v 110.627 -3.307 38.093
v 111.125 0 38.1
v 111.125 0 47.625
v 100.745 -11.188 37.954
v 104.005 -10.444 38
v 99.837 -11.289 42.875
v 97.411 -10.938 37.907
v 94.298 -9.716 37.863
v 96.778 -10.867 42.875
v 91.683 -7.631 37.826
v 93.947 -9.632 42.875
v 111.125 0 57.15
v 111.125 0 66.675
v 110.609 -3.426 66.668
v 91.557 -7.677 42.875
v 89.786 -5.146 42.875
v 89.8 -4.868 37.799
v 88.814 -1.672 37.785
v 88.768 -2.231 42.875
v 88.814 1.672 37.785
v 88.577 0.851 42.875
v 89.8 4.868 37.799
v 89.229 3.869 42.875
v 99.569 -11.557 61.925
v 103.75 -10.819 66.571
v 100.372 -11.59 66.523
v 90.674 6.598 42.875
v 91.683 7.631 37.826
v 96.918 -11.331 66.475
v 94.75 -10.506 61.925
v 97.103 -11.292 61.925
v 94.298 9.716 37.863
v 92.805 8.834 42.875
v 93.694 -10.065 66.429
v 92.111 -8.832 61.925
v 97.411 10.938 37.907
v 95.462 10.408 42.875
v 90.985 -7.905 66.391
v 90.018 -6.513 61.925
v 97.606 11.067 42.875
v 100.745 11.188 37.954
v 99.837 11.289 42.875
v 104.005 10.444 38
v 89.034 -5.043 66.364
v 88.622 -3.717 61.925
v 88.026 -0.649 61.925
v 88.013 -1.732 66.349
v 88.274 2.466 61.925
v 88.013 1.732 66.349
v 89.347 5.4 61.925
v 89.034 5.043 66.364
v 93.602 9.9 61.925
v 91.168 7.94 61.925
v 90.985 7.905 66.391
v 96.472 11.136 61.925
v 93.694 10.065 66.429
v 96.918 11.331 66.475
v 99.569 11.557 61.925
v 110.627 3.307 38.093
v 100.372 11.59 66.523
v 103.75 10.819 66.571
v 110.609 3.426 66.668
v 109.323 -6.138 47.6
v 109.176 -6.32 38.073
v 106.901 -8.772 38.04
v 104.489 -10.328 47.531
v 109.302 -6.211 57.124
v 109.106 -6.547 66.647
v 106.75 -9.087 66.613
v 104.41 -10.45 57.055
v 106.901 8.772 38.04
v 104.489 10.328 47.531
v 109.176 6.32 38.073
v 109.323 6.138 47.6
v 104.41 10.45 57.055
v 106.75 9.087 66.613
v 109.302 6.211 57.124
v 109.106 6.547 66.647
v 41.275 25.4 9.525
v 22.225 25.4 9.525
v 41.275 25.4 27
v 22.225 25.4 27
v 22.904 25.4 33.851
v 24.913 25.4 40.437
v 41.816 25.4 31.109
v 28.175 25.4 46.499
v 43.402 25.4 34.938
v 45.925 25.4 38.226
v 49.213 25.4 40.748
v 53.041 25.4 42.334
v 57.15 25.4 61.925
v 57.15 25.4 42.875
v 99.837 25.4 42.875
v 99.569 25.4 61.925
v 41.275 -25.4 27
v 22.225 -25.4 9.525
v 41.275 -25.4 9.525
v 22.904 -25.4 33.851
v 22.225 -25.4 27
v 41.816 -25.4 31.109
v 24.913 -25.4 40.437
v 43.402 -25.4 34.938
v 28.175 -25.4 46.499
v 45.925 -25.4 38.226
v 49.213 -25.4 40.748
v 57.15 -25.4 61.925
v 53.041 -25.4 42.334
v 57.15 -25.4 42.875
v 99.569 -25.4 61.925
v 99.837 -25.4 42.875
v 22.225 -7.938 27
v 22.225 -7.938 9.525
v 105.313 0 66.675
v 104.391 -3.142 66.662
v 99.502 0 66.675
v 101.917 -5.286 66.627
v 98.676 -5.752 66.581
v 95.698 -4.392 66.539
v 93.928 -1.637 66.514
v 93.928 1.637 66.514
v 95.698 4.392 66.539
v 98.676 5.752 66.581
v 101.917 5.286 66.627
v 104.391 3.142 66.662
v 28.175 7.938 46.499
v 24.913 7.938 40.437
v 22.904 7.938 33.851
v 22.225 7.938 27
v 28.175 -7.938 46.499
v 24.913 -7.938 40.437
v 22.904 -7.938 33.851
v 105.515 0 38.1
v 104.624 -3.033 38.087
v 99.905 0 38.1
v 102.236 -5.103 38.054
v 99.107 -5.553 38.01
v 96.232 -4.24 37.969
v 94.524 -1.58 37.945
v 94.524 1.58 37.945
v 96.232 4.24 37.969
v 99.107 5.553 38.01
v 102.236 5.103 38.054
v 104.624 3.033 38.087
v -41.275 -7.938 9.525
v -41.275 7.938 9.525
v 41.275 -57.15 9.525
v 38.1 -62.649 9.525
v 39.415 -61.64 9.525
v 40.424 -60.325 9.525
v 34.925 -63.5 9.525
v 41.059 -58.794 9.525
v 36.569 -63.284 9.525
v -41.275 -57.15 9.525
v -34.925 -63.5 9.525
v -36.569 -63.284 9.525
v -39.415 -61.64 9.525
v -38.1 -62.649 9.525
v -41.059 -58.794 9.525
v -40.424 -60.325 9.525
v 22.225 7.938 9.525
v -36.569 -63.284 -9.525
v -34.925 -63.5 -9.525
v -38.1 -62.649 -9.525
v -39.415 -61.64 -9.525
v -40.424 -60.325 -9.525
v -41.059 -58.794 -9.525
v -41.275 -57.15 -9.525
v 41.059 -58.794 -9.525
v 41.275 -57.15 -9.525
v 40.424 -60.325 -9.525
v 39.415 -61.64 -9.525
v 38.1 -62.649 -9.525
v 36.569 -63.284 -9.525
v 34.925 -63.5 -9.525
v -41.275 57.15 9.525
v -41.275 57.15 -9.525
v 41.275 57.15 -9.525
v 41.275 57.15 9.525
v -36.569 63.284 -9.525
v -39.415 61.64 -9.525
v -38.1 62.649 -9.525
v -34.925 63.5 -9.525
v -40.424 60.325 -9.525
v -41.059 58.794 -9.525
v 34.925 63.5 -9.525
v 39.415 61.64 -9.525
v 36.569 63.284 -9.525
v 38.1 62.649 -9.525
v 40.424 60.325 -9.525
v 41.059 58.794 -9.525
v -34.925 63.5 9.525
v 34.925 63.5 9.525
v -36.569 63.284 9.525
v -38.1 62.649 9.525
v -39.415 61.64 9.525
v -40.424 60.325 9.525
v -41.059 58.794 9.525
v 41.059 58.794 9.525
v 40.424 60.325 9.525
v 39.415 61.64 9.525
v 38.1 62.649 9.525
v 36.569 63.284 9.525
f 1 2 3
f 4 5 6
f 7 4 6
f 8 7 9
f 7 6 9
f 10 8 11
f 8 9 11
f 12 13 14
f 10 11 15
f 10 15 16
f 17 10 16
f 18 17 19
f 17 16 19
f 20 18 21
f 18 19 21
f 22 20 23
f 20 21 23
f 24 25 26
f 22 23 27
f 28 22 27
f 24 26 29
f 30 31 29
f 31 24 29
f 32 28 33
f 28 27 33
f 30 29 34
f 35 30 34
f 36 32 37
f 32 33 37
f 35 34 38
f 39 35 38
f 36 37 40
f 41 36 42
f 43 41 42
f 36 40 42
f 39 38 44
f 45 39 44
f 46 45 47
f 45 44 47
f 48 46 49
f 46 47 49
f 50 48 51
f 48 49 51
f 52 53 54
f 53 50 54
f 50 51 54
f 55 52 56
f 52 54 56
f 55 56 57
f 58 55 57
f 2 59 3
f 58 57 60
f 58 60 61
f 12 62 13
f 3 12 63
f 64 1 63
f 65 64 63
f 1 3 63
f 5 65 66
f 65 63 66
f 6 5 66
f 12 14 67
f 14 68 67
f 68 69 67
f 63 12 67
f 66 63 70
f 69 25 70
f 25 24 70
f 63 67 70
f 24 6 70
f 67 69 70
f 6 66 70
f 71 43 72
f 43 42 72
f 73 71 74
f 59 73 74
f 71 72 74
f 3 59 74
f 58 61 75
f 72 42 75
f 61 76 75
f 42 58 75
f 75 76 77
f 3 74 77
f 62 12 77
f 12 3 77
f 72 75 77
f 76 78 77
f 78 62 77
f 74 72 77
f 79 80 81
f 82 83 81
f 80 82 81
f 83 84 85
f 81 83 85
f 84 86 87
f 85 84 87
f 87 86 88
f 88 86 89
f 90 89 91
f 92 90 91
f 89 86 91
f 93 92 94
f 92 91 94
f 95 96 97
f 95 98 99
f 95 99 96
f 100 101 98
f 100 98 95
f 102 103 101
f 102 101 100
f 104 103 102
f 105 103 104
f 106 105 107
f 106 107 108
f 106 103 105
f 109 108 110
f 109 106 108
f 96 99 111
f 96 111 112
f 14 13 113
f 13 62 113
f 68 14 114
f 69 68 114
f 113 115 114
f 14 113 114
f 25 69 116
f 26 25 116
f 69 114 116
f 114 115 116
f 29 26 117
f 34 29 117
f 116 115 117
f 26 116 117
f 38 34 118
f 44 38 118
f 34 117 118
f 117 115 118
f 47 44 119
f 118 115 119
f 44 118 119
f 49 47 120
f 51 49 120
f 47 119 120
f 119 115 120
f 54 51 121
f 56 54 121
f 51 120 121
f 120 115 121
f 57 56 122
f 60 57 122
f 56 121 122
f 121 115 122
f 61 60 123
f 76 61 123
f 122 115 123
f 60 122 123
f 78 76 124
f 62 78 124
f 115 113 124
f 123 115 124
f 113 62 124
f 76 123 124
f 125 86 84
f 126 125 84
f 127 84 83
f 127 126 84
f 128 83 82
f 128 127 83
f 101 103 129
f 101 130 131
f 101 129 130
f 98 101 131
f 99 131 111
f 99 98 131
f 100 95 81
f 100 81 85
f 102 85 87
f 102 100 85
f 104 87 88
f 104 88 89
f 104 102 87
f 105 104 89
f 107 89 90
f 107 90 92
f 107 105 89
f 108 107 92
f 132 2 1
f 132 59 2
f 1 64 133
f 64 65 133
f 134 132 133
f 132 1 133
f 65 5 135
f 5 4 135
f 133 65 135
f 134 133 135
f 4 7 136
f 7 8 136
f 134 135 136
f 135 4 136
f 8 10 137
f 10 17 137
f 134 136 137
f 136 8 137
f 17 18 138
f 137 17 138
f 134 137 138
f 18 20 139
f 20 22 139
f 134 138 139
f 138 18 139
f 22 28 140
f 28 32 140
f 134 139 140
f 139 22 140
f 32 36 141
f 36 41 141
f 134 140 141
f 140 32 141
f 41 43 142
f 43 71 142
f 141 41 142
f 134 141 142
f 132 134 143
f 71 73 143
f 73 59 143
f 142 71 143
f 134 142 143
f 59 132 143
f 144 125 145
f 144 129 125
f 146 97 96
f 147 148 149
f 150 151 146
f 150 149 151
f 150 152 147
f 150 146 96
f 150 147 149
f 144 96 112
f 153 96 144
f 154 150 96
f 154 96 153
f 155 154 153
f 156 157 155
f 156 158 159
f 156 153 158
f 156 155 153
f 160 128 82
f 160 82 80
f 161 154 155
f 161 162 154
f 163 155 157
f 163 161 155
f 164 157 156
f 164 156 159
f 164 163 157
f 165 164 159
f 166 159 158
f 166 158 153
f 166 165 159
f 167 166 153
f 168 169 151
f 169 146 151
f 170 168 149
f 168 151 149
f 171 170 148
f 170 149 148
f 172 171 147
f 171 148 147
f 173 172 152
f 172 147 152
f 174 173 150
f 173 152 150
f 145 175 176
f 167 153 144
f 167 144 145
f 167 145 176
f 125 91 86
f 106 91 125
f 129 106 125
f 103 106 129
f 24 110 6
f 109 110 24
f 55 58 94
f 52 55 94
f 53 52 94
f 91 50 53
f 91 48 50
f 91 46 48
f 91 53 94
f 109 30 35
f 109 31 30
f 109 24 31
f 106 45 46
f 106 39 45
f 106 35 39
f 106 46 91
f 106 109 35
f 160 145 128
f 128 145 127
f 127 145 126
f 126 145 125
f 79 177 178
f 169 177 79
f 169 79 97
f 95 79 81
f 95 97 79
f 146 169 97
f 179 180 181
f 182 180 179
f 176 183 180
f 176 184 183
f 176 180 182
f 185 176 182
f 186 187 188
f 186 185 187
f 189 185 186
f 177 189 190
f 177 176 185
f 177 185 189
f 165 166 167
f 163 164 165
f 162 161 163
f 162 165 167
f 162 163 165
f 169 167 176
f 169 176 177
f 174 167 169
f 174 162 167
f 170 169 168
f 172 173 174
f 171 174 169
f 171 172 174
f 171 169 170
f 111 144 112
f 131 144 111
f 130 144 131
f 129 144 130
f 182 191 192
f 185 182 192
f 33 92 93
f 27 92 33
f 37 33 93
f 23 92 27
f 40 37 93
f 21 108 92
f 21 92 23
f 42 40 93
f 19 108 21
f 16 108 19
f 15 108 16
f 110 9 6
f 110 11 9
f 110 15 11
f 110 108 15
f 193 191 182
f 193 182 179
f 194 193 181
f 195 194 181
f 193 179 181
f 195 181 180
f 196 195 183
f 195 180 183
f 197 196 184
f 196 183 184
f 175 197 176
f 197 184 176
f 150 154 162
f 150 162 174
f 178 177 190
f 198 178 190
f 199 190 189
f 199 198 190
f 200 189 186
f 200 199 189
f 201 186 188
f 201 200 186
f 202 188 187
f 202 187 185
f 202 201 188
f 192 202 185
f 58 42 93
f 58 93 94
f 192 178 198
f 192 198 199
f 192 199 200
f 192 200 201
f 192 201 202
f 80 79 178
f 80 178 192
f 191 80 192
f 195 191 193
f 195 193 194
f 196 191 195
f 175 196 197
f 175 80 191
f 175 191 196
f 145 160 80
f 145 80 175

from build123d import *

# Parameters (mm, degrees)
F1_DEPTH = 63.5
F2_DEPTH = 25.4
F3_DEPTH = 7.9375
F5_R     = 6.35


with BuildPart() as f1:
    # F0 (on Front) → F1 (new body, symmetric)
    with BuildSketch(Plane.XZ):
        Polygon((41.275, -9.525), (41.275, 9.525), (22.225, 9.525), (-41.275, 9.525), (-41.275, -9.525), align=None)
    extrude(amount=F1_DEPTH, both=True)

    # F0 (on Front) → F2 (join, symmetric)
    with BuildSketch(Plane.XZ):
        with BuildLine():
            Line((22.225, 9.525), (41.275, 9.525))
            Line((41.275, 9.525), (41.275, 27.0002))
            ThreePointArc((41.275, 27.0002), (45.9246798487, 38.2255201513), (57.15, 42.8752))
            Line((57.15, 42.8752), (60.325, 42.8752))
            Line((60.325, 42.8752), (60.325, 61.9252))
            Line((60.325, 61.9252), (57.15, 61.9252))
            Line((57.15, 61.9252), (28.1752493255, 46.4994166087))
            ThreePointArc((28.1752493255, 46.4994166087), (23.7456680032, 37.1936404813), (22.225, 27.0002))
            Line((22.225, 27.0002), (22.225, 9.525))
        make_face()
        Polygon((60.325, 61.9252), (60.325, 42.8752), (99.8372383581, 42.8752), (99.5686697629, 61.9252), align=None)
    extrude(amount=F2_DEPTH, both=True)

    # F0 (on Front) → F3 (join, symmetric)
    with BuildSketch(Plane.XZ):
        with BuildLine():
            Line((-41.275, 9.525), (22.225, 9.525))
            Line((22.225, 9.525), (22.225, 27.0002))
            ThreePointArc((22.225, 27.0002), (23.7456680032, 37.1936404813), (28.1752493255, 46.4994166087))
            Line((28.1752493255, 46.4994166087), (-41.275, 9.525))
        make_face()
    extrude(amount=F3_DEPTH, both=True)

    # F0 (on Front) → F4 (revolve)
    with BuildSketch(Plane.XZ):
        Polygon((99.5686697629, 61.9252), (99.8372383581, 42.8752), (99.9045595527, 38.1), (111.125, 38.1), (111.125, 66.675), (99.5017066598, 66.675), align=None)
    revolve(axis=Axis((99.7031331062, 0, 52.3875), (0.0140966882, 0, -0.9999006368)))

    # F5
    f5_edges = [f1.edges().sort_by_distance(p)[0] for p in [
        (41.275, -63.5, 0),
        (-41.275, -63.5, 0),
        (41.275, 63.5, 0),
        (-41.275, 63.5, 0),
    ]]
    fillet(f5_edges, radius=F5_R)


solid = f1.part
